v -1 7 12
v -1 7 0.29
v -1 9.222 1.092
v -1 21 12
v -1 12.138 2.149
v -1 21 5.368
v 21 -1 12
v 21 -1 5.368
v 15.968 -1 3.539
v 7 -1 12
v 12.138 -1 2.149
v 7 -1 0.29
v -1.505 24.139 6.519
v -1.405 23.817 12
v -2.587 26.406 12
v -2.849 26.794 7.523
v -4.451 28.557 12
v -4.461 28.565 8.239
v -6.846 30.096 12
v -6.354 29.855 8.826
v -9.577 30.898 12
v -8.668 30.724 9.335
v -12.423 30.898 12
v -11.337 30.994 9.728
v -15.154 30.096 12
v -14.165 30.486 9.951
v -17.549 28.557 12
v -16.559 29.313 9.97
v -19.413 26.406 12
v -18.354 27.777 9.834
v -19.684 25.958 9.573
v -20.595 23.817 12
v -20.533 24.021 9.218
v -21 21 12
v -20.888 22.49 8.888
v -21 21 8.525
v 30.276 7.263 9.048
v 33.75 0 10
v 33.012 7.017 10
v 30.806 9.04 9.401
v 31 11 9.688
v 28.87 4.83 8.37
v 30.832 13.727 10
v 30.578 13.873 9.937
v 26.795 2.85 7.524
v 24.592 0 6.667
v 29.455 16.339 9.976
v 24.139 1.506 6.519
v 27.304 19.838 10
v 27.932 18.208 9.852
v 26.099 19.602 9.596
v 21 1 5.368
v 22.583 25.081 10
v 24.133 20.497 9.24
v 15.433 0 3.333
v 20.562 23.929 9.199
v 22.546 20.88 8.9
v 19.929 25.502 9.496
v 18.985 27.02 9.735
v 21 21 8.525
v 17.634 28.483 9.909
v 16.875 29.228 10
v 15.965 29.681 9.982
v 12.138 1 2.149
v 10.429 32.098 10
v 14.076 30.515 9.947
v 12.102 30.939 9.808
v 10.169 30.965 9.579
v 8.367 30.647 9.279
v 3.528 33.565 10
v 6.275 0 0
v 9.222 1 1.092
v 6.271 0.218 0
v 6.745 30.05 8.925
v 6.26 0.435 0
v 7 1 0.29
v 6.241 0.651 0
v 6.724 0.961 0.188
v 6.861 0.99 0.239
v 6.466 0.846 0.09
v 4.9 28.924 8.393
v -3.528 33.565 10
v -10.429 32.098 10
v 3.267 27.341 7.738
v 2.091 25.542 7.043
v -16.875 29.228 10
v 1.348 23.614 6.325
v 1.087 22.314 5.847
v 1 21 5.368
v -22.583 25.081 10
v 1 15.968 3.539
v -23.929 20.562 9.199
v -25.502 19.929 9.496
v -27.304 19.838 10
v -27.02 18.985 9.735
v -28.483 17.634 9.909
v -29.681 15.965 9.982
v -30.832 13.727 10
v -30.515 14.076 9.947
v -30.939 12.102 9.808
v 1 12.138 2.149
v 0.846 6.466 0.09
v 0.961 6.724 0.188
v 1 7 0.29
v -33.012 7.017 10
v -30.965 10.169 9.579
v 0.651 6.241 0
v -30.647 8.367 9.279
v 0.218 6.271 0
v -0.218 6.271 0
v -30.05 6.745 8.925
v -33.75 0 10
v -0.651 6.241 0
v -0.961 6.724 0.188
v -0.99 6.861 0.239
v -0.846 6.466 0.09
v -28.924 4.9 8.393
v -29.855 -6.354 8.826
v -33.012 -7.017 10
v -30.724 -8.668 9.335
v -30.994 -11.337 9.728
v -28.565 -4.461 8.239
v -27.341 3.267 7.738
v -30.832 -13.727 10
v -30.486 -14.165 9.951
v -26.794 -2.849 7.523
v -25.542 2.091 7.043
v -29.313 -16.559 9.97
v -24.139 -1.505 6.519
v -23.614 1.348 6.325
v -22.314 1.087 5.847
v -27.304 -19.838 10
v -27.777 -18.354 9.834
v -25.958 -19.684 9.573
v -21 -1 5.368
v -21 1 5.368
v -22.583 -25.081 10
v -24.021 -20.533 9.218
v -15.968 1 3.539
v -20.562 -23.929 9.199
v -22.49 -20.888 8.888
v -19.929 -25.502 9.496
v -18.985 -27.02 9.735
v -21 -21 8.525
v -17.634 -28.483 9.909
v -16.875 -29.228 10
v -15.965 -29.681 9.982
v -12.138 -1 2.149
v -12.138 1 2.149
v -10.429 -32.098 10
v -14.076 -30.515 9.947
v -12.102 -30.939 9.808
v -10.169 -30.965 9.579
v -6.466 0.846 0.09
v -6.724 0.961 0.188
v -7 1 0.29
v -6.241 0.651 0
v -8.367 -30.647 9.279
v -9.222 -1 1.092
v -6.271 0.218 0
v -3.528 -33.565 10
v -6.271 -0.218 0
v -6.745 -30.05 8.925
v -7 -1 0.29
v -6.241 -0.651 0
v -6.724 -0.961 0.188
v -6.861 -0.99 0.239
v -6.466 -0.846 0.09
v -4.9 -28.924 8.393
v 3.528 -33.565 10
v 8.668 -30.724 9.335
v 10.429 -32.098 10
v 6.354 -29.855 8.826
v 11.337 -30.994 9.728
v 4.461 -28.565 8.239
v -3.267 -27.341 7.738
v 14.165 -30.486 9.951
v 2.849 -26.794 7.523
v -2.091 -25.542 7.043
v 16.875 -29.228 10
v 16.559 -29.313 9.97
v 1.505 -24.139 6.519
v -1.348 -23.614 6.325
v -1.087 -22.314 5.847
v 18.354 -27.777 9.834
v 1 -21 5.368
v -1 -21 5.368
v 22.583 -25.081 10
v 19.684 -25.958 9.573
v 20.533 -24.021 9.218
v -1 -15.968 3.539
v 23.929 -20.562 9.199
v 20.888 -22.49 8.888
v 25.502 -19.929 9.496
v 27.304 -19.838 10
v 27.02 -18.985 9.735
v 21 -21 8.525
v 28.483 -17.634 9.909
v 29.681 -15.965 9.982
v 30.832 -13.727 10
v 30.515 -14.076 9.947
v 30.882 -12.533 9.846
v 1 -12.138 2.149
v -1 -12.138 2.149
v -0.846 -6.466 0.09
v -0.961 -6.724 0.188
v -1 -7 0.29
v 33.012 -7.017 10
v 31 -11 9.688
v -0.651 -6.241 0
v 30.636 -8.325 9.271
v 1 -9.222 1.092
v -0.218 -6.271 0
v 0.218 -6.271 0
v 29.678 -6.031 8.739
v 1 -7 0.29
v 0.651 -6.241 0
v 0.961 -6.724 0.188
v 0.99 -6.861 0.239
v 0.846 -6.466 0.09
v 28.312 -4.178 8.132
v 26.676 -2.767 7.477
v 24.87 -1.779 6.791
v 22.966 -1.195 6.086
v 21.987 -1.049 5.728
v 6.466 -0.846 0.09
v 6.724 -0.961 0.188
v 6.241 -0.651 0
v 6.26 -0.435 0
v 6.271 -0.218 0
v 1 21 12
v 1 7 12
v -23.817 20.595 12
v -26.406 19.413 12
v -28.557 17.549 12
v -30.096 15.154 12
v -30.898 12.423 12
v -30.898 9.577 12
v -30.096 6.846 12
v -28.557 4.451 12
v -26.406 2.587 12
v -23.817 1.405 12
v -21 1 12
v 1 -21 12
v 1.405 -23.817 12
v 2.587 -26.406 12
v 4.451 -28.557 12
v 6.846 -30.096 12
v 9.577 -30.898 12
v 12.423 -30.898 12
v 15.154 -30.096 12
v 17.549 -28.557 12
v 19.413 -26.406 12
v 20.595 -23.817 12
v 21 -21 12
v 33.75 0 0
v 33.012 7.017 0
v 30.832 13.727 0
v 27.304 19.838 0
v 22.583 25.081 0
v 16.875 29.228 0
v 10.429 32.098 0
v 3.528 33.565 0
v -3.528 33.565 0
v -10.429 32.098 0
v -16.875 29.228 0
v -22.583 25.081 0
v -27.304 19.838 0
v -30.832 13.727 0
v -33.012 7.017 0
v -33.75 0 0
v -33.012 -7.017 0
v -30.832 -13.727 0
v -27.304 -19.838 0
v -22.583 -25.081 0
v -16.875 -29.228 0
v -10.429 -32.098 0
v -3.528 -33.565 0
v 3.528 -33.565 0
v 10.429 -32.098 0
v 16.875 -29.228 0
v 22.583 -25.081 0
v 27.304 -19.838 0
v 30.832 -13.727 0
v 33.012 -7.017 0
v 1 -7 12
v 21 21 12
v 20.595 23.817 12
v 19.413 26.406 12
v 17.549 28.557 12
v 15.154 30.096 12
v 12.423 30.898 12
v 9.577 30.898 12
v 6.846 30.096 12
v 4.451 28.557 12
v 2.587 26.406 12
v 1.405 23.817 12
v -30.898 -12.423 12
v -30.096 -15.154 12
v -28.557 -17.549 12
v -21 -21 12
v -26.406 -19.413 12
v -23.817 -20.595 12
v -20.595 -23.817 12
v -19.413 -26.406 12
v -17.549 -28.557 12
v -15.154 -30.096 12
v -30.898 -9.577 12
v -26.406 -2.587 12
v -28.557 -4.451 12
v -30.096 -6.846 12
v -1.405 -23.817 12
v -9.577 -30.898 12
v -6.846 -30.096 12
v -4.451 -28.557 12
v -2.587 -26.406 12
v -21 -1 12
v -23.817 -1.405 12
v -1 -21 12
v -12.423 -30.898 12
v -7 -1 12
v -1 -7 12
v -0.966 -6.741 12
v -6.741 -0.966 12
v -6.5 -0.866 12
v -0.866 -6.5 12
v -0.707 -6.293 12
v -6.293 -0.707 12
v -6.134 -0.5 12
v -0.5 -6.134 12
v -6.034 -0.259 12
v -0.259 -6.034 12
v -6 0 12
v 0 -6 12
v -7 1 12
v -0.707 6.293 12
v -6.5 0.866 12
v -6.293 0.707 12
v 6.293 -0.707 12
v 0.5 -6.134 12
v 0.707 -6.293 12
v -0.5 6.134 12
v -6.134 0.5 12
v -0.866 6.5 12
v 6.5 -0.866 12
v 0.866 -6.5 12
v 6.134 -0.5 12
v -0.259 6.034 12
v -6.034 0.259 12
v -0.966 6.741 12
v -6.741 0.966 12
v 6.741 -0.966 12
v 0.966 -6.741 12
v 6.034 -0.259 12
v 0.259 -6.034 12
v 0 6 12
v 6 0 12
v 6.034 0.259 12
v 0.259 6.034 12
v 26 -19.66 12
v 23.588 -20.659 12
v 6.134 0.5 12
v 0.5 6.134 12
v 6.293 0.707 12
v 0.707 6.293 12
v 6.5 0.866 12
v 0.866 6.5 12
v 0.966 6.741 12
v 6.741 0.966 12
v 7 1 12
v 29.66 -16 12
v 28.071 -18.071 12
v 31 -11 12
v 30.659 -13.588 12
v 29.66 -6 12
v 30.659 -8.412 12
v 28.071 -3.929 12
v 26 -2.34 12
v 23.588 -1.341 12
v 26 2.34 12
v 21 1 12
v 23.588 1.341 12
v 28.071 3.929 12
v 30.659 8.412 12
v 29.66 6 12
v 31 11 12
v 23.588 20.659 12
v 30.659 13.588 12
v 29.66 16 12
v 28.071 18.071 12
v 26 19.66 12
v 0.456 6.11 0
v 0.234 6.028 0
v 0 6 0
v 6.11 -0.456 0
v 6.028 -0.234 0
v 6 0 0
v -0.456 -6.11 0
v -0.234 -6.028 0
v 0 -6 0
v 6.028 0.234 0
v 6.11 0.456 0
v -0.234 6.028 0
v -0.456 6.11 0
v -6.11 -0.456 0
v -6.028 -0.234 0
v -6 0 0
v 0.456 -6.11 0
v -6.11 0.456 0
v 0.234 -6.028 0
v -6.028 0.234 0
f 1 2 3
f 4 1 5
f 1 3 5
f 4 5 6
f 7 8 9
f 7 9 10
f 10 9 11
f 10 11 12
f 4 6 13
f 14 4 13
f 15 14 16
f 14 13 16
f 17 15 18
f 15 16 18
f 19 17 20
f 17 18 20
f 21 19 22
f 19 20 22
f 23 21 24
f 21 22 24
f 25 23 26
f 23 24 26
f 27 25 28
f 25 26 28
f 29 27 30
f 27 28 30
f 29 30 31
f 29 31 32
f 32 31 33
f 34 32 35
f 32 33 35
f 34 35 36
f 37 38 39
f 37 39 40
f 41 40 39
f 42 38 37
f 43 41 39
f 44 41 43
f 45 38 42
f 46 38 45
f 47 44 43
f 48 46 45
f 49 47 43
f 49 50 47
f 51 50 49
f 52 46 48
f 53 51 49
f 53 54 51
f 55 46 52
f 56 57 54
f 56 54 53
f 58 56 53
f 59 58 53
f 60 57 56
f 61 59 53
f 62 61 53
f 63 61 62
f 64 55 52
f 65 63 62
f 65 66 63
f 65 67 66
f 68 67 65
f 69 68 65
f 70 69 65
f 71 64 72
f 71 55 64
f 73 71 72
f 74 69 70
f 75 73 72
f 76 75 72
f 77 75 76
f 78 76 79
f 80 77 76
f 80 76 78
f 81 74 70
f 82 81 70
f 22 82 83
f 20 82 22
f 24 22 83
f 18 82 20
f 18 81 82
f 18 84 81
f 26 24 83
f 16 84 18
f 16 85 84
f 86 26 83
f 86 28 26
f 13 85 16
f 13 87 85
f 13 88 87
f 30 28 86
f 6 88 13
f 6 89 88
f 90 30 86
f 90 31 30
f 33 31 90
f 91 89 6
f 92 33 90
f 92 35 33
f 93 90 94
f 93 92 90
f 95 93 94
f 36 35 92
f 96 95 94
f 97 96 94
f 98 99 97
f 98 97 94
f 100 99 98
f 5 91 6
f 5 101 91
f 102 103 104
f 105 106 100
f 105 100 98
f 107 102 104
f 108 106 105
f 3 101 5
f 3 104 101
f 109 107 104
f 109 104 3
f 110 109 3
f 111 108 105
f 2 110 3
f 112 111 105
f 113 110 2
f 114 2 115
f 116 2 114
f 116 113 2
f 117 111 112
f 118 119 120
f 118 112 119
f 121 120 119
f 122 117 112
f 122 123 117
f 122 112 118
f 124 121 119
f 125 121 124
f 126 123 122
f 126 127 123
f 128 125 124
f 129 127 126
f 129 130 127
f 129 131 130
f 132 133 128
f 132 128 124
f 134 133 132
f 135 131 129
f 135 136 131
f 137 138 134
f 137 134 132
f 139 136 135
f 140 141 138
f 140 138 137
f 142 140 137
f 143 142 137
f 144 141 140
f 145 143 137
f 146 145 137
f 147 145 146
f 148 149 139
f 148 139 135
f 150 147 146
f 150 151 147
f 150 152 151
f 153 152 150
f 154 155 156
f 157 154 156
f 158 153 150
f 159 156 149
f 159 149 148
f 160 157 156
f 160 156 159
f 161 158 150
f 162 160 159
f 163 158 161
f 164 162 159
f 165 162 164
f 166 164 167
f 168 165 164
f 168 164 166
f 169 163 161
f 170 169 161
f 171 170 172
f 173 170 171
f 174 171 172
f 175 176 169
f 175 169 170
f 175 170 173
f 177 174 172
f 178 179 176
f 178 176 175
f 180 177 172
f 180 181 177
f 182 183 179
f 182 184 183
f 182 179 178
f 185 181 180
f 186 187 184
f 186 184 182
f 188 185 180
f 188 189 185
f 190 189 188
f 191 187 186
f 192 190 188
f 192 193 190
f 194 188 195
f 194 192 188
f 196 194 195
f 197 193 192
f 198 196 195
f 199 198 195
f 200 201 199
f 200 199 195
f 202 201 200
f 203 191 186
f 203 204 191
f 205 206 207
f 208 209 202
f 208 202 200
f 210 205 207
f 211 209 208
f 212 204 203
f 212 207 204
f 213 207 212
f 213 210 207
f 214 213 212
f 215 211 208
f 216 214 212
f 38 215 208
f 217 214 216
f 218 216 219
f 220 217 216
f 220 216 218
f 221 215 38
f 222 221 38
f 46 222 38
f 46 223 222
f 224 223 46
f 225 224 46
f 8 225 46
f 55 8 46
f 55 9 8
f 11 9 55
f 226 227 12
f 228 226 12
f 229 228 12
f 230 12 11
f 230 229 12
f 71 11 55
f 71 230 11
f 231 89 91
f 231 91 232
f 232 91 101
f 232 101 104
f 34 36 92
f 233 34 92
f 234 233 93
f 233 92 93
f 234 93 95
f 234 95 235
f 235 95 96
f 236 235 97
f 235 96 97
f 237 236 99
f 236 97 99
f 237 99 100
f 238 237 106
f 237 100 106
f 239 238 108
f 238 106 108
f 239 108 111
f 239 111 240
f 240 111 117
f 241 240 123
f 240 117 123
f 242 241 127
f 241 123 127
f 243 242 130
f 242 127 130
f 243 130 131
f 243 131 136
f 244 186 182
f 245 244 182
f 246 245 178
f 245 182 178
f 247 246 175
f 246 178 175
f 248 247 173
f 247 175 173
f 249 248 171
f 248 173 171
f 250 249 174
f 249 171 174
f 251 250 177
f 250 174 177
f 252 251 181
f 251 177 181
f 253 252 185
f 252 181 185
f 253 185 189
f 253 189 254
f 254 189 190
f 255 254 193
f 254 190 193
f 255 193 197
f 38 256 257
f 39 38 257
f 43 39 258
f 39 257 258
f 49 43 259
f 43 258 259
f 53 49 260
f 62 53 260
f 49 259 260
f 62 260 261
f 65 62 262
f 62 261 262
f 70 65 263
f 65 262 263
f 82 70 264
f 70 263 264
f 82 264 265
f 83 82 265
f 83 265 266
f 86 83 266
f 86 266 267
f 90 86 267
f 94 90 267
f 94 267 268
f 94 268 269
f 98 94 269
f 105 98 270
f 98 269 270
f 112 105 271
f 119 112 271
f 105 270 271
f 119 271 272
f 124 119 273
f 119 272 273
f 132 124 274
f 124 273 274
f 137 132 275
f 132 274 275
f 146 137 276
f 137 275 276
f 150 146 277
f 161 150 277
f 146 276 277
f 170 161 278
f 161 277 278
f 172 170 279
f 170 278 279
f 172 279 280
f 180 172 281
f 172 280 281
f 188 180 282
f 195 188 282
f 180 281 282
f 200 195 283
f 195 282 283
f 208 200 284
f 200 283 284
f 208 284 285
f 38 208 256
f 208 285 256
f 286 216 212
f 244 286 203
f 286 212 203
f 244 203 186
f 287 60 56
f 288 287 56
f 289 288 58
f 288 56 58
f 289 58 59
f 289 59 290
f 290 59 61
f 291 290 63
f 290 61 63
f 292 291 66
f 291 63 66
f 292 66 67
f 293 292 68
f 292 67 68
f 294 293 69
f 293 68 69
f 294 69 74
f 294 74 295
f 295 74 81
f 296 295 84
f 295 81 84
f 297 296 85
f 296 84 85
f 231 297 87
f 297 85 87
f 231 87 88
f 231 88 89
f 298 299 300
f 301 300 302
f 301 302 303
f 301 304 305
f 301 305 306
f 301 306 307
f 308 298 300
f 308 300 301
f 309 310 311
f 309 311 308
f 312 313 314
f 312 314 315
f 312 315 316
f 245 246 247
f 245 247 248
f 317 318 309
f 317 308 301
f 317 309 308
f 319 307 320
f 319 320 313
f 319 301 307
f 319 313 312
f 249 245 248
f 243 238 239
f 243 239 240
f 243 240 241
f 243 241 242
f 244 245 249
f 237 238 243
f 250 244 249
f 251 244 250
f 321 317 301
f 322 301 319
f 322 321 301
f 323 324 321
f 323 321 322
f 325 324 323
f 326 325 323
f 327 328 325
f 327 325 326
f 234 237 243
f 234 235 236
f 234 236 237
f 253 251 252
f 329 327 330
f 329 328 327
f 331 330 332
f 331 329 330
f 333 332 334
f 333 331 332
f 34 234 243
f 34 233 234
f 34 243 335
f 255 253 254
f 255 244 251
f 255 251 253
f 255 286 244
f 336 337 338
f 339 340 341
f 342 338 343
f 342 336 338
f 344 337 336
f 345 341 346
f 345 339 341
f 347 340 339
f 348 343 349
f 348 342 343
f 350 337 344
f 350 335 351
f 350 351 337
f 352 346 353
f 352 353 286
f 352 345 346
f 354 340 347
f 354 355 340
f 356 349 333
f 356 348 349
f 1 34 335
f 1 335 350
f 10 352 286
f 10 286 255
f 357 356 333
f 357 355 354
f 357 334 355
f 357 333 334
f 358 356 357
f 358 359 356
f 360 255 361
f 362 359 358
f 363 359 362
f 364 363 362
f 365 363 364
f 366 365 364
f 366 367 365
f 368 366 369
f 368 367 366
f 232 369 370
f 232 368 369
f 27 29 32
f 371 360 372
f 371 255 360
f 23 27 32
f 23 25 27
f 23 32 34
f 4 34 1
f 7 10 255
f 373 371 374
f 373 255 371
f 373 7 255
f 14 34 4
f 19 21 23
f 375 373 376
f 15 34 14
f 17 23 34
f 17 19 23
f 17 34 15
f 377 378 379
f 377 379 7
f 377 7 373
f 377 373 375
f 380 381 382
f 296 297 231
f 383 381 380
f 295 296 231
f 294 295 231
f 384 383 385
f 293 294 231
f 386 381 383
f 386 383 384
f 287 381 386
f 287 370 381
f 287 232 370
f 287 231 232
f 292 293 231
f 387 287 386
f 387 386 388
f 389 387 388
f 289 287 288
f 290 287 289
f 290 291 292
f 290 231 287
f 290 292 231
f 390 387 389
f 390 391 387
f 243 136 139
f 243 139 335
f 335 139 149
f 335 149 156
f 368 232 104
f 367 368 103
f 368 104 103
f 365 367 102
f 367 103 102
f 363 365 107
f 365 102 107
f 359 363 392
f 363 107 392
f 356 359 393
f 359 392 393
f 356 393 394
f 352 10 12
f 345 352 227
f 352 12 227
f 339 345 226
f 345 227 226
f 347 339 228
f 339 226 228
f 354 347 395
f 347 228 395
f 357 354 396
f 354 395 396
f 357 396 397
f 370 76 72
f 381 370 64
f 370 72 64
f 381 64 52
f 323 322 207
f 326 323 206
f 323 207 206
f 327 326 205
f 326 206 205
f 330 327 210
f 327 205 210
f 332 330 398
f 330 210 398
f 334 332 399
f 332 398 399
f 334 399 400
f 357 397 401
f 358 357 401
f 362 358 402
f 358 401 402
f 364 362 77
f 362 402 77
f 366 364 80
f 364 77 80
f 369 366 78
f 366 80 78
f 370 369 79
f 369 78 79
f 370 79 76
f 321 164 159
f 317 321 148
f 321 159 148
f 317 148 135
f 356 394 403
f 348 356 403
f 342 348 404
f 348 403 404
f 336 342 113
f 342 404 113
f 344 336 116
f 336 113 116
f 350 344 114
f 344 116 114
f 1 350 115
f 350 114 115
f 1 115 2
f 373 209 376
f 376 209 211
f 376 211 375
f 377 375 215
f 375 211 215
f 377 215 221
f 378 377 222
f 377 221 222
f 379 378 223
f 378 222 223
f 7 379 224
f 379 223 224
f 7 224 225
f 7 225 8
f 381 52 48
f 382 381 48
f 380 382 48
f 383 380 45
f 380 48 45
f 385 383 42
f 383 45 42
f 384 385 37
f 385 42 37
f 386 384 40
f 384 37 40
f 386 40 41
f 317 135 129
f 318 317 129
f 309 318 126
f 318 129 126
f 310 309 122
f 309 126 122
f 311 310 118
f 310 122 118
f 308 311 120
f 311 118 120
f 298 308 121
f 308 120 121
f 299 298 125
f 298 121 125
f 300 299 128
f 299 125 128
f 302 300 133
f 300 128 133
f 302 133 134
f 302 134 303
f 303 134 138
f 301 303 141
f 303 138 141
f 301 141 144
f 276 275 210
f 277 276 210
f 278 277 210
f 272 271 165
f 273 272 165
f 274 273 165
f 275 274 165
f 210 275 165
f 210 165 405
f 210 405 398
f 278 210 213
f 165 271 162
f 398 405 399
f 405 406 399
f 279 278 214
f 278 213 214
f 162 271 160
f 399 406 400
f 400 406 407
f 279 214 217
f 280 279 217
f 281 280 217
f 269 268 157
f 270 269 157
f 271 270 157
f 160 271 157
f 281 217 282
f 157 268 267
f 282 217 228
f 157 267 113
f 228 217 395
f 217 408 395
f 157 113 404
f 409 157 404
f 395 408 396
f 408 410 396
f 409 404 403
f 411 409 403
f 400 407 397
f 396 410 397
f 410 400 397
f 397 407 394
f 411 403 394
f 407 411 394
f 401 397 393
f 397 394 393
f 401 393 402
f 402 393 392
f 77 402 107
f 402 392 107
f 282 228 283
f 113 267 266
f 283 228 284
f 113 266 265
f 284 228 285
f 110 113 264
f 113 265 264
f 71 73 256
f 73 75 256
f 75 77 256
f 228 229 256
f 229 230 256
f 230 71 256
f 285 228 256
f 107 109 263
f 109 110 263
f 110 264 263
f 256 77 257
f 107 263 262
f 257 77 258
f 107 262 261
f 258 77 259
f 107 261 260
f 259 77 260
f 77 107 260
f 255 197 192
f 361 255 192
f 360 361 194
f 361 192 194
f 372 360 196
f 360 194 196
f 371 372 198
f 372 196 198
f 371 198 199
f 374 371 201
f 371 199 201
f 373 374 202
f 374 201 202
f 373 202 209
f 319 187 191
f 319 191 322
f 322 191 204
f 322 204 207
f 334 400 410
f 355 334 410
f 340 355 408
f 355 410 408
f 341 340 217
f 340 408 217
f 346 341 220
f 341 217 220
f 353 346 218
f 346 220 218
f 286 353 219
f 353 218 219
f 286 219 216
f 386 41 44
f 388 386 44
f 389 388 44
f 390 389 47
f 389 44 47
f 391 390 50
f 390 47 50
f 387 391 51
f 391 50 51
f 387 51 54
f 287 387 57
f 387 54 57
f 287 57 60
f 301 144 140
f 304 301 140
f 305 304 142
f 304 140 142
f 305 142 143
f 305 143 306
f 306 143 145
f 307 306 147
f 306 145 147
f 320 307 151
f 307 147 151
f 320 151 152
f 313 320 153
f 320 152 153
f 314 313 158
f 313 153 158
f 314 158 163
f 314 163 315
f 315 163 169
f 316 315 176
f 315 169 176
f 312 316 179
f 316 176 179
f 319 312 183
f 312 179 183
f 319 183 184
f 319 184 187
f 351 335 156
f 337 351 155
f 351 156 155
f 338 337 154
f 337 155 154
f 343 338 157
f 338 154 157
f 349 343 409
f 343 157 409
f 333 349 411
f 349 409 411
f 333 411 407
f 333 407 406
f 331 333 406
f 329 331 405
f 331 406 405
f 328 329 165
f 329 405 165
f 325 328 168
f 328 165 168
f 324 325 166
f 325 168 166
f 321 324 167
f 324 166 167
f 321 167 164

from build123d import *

# Parameters (mm, degrees)
F0_R     = 33.75
F1_DEPTH = 10
F2_R     = 33.75
F3_DEPTH = 10
F3_TAPER = 70
F4_DEPTH = 12


with BuildPart() as f1:
    # F0 (on Top) → F1 (new body)
    with BuildSketch(Plane.XY):
        Circle(F0_R)
        with BuildLine():
            Line((-21, 0), (-21, 1))
            ThreePointArc((-21, 1), (-31, 11), (-21, 21))
            ThreePointArc((-21, 21), (-11, 31), (-1, 21))
            Line((-1, 21), (0, 21))
            Line((0, 21), (1, 21))
            ThreePointArc((1, 21), (11, 31), (21, 21))
            ThreePointArc((21, 21), (28.0710678119, 18.0710678119), (31, 11))
            ThreePointArc((31, 11), (28.0710678119, 3.9289321881), (21, 1))
            Line((21, 1), (21, 0))
            Line((21, 0), (21, -1))
            ThreePointArc((21, -1), (28.0710678119, -3.9289321881), (31, -11))
            ThreePointArc((31, -11), (28.0710678119, -18.0710678119), (21, -21))
            ThreePointArc((21, -21), (11, -31), (1, -21))
            Line((1, -21), (0, -21))
            Line((0, -21), (-1, -21))
            ThreePointArc((-1, -21), (-11, -31), (-21, -21))
            ThreePointArc((-21, -21), (-31, -11), (-21, -1))
            Line((-21, -1), (-21, 0))
        make_face(mode=Mode.SUBTRACT)
        with BuildLine():
            ThreePointArc((-21, 21), (-31, 11), (-21, 1))
            ThreePointArc((-21, 1), (-13.9289321881, 3.9289321881), (-11, 11))
            ThreePointArc((-11, 11), (-18.0710678119, 13.9289321881), (-21, 21))
        make_face()
        with BuildLine():
            ThreePointArc((-11, 11), (-3.9289321881, 13.9289321881), (-1, 21))
            ThreePointArc((-1, 21), (-11, 31), (-21, 21))
            ThreePointArc((-21, 21), (-13.9289321881, 18.0710678119), (-11, 11))
        make_face()
        with BuildLine():
            ThreePointArc((21, 21), (11, 31), (1, 21))
            ThreePointArc((1, 21), (3.9289321881, 13.9289321881), (11, 11))
            ThreePointArc((11, 11), (13.9289321881, 18.0710678119), (21, 21))
        make_face()
        with BuildLine():
            ThreePointArc((11, 11), (13.9289321881, 3.9289321881), (21, 1))
            ThreePointArc((21, 1), (28.0710678119, 3.9289321881), (31, 11))
            ThreePointArc((31, 11), (28.0710678119, 18.0710678119), (21, 21))
            ThreePointArc((21, 21), (18.0710678119, 13.9289321881), (11, 11))
        make_face()
        with BuildLine():
            ThreePointArc((31, -11), (28.0710678119, -3.9289321881), (21, -1))
            ThreePointArc((21, -1), (13.9289321881, -3.9289321881), (11, -11))
            ThreePointArc((11, -11), (18.0710678119, -13.9289321881), (21, -21))
            ThreePointArc((21, -21), (28.0710678119, -18.0710678119), (31, -11))
        make_face()
        with BuildLine():
            ThreePointArc((11, -11), (3.9289321881, -13.9289321881), (1, -21))
            ThreePointArc((1, -21), (11, -31), (21, -21))
            ThreePointArc((21, -21), (13.9289321881, -18.0710678119), (11, -11))
        make_face()
        with BuildLine():
            ThreePointArc((-21, -21), (-11, -31), (-1, -21))
            ThreePointArc((-1, -21), (-3.9289321881, -13.9289321881), (-11, -11))
            ThreePointArc((-11, -11), (-13.9289321881, -18.0710678119), (-21, -21))
        make_face()
        with BuildLine():
            ThreePointArc((-11, -11), (-13.9289321881, -3.9289321881), (-21, -1))
            ThreePointArc((-21, -1), (-31, -11), (-21, -21))
            ThreePointArc((-21, -21), (-18.0710678119, -13.9289321881), (-11, -11))
        make_face()
        with BuildLine():
            Line((0, -6), (0, 0))
            Line((0, 0), (-6, 0))
            ThreePointArc((-6, 0), (-6.2928932188, -0.7071067812), (-7, -1))
            Line((-7, -1), (-21, -1))
            ThreePointArc((-21, -1), (-13.9289321881, -3.9289321881), (-11, -11))
            ThreePointArc((-11, -11), (-3.9289321881, -13.9289321881), (-1, -21))
            Line((-1, -21), (-1, -7))
            ThreePointArc((-1, -7), (-0.7071067812, -6.2928932188), (0, -6))
        make_face()
        with BuildLine():
            Line((6, 0), (0, 0))
            Line((0, 0), (0, -6))
            ThreePointArc((0, -6), (0.7071067812, -6.2928932188), (1, -7))
            Line((1, -7), (1, -21))
            ThreePointArc((1, -21), (3.9289321881, -13.9289321881), (11, -11))
            ThreePointArc((11, -11), (13.9289321881, -3.9289321881), (21, -1))
            Line((21, -1), (7, -1))
            ThreePointArc((7, -1), (6.2928932188, -0.7071067812), (6, 0))
        make_face()
        with BuildLine():
            Line((0, 6), (0, 0))
            Line((0, 0), (6, 0))
            ThreePointArc((6, 0), (6.2928932188, 0.7071067812), (7, 1))
            Line((7, 1), (21, 1))
            ThreePointArc((21, 1), (13.9289321881, 3.9289321881), (11, 11))
            ThreePointArc((11, 11), (3.9289321881, 13.9289321881), (1, 21))
            Line((1, 21), (1, 7))
            ThreePointArc((1, 7), (0.7071067812, 6.2928932188), (0, 6))
        make_face()
        with BuildLine():
            Line((-6, 0), (0, 0))
            Line((0, 0), (0, 6))
            ThreePointArc((0, 6), (-0.7071067812, 6.2928932188), (-1, 7))
            Line((-1, 7), (-1, 21))
            ThreePointArc((-1, 21), (-3.9289321881, 13.9289321881), (-11, 11))
            ThreePointArc((-11, 11), (-13.9289321881, 3.9289321881), (-21, 1))
            Line((-21, 1), (-7, 1))
            ThreePointArc((-7, 1), (-6.2928932188, 0.7071067812), (-6, 0))
        make_face()
        with BuildLine():
            ThreePointArc((-21, 21), (-18.0710678119, 13.9289321881), (-11, 11))
            ThreePointArc((-11, 11), (-13.9289321881, 18.0710678119), (-21, 21))
        make_face()
        with BuildLine():
            ThreePointArc((21, 21), (13.9289321881, 18.0710678119), (11, 11))
            ThreePointArc((11, 11), (18.0710678119, 13.9289321881), (21, 21))
        make_face()
        with BuildLine():
            ThreePointArc((21, -21), (18.0710678119, -13.9289321881), (11, -11))
            ThreePointArc((11, -11), (13.9289321881, -18.0710678119), (21, -21))
        make_face()
        with BuildLine():
            ThreePointArc((-21, -21), (-13.9289321881, -18.0710678119), (-11, -11))
            ThreePointArc((-11, -11), (-18.0710678119, -13.9289321881), (-21, -21))
        make_face()
        with BuildLine():
            ThreePointArc((0, 8), (0.7071067812, 7.7071067812), (1, 7))
            Line((1, 7), (1, 21))
            Line((1, 21), (0, 21))
            Line((0, 21), (0, 8))
        make_face()
        with BuildLine():
            Line((-1, 21), (-1, 7))
            ThreePointArc((-1, 7), (-0.7071067812, 7.7071067812), (0, 8))
            Line((0, 8), (0, 21))
            Line((0, 21), (-1, 21))
        make_face()
        with BuildLine():
            Line((-21, -1), (-7, -1))
            ThreePointArc((-7, -1), (-7.7071067812, -0.7071067812), (-8, 0))
            Line((-8, 0), (-21, 0))
            Line((-21, 0), (-21, -1))
        make_face()
        with BuildLine():
            ThreePointArc((-8, 0), (-7.7071067812, 0.7071067812), (-7, 1))
            Line((-7, 1), (-21, 1))
            Line((-21, 1), (-21, 0))
            Line((-21, 0), (-8, 0))
        make_face()
        with BuildLine():
            Line((21, 1), (7, 1))
            ThreePointArc((7, 1), (7.7071067812, 0.7071067812), (8, 0))
            Line((8, 0), (21, 0))
            Line((21, 0), (21, 1))
        make_face()
        with BuildLine():
            ThreePointArc((8, 0), (7.7071067812, -0.7071067812), (7, -1))
            Line((7, -1), (21, -1))
            Line((21, -1), (21, 0))
            Line((21, 0), (8, 0))
        make_face()
        with BuildLine():
            Line((1, -21), (1, -7))
            ThreePointArc((1, -7), (0.7071067812, -7.7071067812), (0, -8))
            Line((0, -8), (0, -21))
            Line((0, -21), (1, -21))
        make_face()
        with BuildLine():
            ThreePointArc((0, -8), (-0.7071067812, -7.7071067812), (-1, -7))
            Line((-1, -7), (-1, -21))
            Line((-1, -21), (0, -21))
            Line((0, -21), (0, -8))
        make_face()
        with BuildLine():
            ThreePointArc((-1, 7), (-0.7071067812, 6.2928932188), (0, 6))
            Line((0, 6), (0, 7))
            Line((0, 7), (0, 8))
            ThreePointArc((0, 8), (-0.7071067812, 7.7071067812), (-1, 7))
        make_face()
        with BuildLine():
            Line((0, 7), (0, 6))
            ThreePointArc((0, 6), (0.7071067812, 6.2928932188), (1, 7))
            ThreePointArc((1, 7), (0.7071067812, 7.7071067812), (0, 8))
            Line((0, 8), (0, 7))
        make_face()
        with BuildLine():
            Line((-7, 0), (-6, 0))
            ThreePointArc((-6, 0), (-6.2928932188, 0.7071067812), (-7, 1))
            ThreePointArc((-7, 1), (-7.7071067812, 0.7071067812), (-8, 0))
            Line((-8, 0), (-7, 0))
        make_face()
        with BuildLine():
            ThreePointArc((-7, -1), (-6.2928932188, -0.7071067812), (-6, 0))
            Line((-6, 0), (-7, 0))
            Line((-7, 0), (-8, 0))
            ThreePointArc((-8, 0), (-7.7071067812, -0.7071067812), (-7, -1))
        make_face()
        with BuildLine():
            Line((7, 0), (6, 0))
            ThreePointArc((6, 0), (6.2928932188, -0.7071067812), (7, -1))
            ThreePointArc((7, -1), (7.7071067812, -0.7071067812), (8, 0))
            Line((8, 0), (7, 0))
        make_face()
        with BuildLine():
            ThreePointArc((7, 1), (6.2928932188, 0.7071067812), (6, 0))
            Line((6, 0), (7, 0))
            Line((7, 0), (8, 0))
            ThreePointArc((8, 0), (7.7071067812, 0.7071067812), (7, 1))
        make_face()
        with BuildLine():
            Line((0, -7), (0, -6))
            ThreePointArc((0, -6), (-0.7071067812, -6.2928932188), (-1, -7))
            ThreePointArc((-1, -7), (-0.7071067812, -7.7071067812), (0, -8))
            Line((0, -8), (0, -7))
        make_face()
        with BuildLine():
            ThreePointArc((1, -7), (0.7071067812, -6.2928932188), (0, -6))
            Line((0, -6), (0, -7))
            Line((0, -7), (0, -8))
            ThreePointArc((0, -8), (0.7071067812, -7.7071067812), (1, -7))
        make_face()
    extrude(amount=F1_DEPTH)

    # F2 (on face) → F3 (cut)
    with BuildSketch(Plane.XY.offset(10)):
        Circle(F2_R)
    extrude(amount=-F3_DEPTH, taper=F3_TAPER, mode=Mode.SUBTRACT)

    # F0 (on Top) → F4 (join)
    with BuildSketch(Plane.XY):
        with BuildLine():
            ThreePointArc((11, -11), (3.9289321881, -13.9289321881), (1, -21))
            ThreePointArc((1, -21), (11, -31), (21, -21))
            ThreePointArc((21, -21), (13.9289321881, -18.0710678119), (11, -11))
        make_face()
        with BuildLine():
            ThreePointArc((21, -21), (18.0710678119, -13.9289321881), (11, -11))
            ThreePointArc((11, -11), (13.9289321881, -18.0710678119), (21, -21))
        make_face()
        with BuildLine():
            ThreePointArc((31, -11), (28.0710678119, -3.9289321881), (21, -1))
            ThreePointArc((21, -1), (13.9289321881, -3.9289321881), (11, -11))
            ThreePointArc((11, -11), (18.0710678119, -13.9289321881), (21, -21))
            ThreePointArc((21, -21), (28.0710678119, -18.0710678119), (31, -11))
        make_face()
        with BuildLine():
            ThreePointArc((11, 11), (13.9289321881, 3.9289321881), (21, 1))
            ThreePointArc((21, 1), (28.0710678119, 3.9289321881), (31, 11))
            ThreePointArc((31, 11), (28.0710678119, 18.0710678119), (21, 21))
            ThreePointArc((21, 21), (18.0710678119, 13.9289321881), (11, 11))
        make_face()
        with BuildLine():
            ThreePointArc((21, 21), (13.9289321881, 18.0710678119), (11, 11))
            ThreePointArc((11, 11), (18.0710678119, 13.9289321881), (21, 21))
        make_face()
        with BuildLine():
            ThreePointArc((21, 21), (11, 31), (1, 21))
            ThreePointArc((1, 21), (3.9289321881, 13.9289321881), (11, 11))
            ThreePointArc((11, 11), (13.9289321881, 18.0710678119), (21, 21))
        make_face()
        with BuildLine():
            ThreePointArc((-11, 11), (-3.9289321881, 13.9289321881), (-1, 21))
            ThreePointArc((-1, 21), (-11, 31), (-21, 21))
            ThreePointArc((-21, 21), (-13.9289321881, 18.0710678119), (-11, 11))
        make_face()
        with BuildLine():
            ThreePointArc((-21, 21), (-18.0710678119, 13.9289321881), (-11, 11))
            ThreePointArc((-11, 11), (-13.9289321881, 18.0710678119), (-21, 21))
        make_face()
        with BuildLine():
            ThreePointArc((-21, 21), (-31, 11), (-21, 1))
            ThreePointArc((-21, 1), (-13.9289321881, 3.9289321881), (-11, 11))
            ThreePointArc((-11, 11), (-18.0710678119, 13.9289321881), (-21, 21))
        make_face()
        with BuildLine():
            ThreePointArc((-11, -11), (-13.9289321881, -3.9289321881), (-21, -1))
            ThreePointArc((-21, -1), (-31, -11), (-21, -21))
            ThreePointArc((-21, -21), (-18.0710678119, -13.9289321881), (-11, -11))
        make_face()
        with BuildLine():
            ThreePointArc((-21, -21), (-11, -31), (-1, -21))
            ThreePointArc((-1, -21), (-3.9289321881, -13.9289321881), (-11, -11))
            ThreePointArc((-11, -11), (-13.9289321881, -18.0710678119), (-21, -21))
        make_face()
        with BuildLine():
            ThreePointArc((-21, -21), (-13.9289321881, -18.0710678119), (-11, -11))
            ThreePointArc((-11, -11), (-18.0710678119, -13.9289321881), (-21, -21))
        make_face()
        with BuildLine():
            Line((0, -6), (0, 0))
            Line((0, 0), (-6, 0))
            ThreePointArc((-6, 0), (-6.2928932188, -0.7071067812), (-7, -1))
            Line((-7, -1), (-21, -1))
            ThreePointArc((-21, -1), (-13.9289321881, -3.9289321881), (-11, -11))
            ThreePointArc((-11, -11), (-3.9289321881, -13.9289321881), (-1, -21))
            Line((-1, -21), (-1, -7))
            ThreePointArc((-1, -7), (-0.7071067812, -6.2928932188), (0, -6))
        make_face()
        with BuildLine():
            Line((6, 0), (0, 0))
            Line((0, 0), (0, -6))
            ThreePointArc((0, -6), (0.7071067812, -6.2928932188), (1, -7))
            Line((1, -7), (1, -21))
            ThreePointArc((1, -21), (3.9289321881, -13.9289321881), (11, -11))
            ThreePointArc((11, -11), (13.9289321881, -3.9289321881), (21, -1))
            Line((21, -1), (7, -1))
            ThreePointArc((7, -1), (6.2928932188, -0.7071067812), (6, 0))
        make_face()
        with BuildLine():
            Line((0, 6), (0, 0))
            Line((0, 0), (6, 0))
            ThreePointArc((6, 0), (6.2928932188, 0.7071067812), (7, 1))
            Line((7, 1), (21, 1))
            ThreePointArc((21, 1), (13.9289321881, 3.9289321881), (11, 11))
            ThreePointArc((11, 11), (3.9289321881, 13.9289321881), (1, 21))
            Line((1, 21), (1, 7))
            ThreePointArc((1, 7), (0.7071067812, 6.2928932188), (0, 6))
        make_face()
        with BuildLine():
            Line((-6, 0), (0, 0))
            Line((0, 0), (0, 6))
            ThreePointArc((0, 6), (-0.7071067812, 6.2928932188), (-1, 7))
            Line((-1, 7), (-1, 21))
            ThreePointArc((-1, 21), (-3.9289321881, 13.9289321881), (-11, 11))
            ThreePointArc((-11, 11), (-13.9289321881, 3.9289321881), (-21, 1))
            Line((-21, 1), (-7, 1))
            ThreePointArc((-7, 1), (-6.2928932188, 0.7071067812), (-6, 0))
        make_face()
    extrude(amount=F4_DEPTH)


solid = f1.part
